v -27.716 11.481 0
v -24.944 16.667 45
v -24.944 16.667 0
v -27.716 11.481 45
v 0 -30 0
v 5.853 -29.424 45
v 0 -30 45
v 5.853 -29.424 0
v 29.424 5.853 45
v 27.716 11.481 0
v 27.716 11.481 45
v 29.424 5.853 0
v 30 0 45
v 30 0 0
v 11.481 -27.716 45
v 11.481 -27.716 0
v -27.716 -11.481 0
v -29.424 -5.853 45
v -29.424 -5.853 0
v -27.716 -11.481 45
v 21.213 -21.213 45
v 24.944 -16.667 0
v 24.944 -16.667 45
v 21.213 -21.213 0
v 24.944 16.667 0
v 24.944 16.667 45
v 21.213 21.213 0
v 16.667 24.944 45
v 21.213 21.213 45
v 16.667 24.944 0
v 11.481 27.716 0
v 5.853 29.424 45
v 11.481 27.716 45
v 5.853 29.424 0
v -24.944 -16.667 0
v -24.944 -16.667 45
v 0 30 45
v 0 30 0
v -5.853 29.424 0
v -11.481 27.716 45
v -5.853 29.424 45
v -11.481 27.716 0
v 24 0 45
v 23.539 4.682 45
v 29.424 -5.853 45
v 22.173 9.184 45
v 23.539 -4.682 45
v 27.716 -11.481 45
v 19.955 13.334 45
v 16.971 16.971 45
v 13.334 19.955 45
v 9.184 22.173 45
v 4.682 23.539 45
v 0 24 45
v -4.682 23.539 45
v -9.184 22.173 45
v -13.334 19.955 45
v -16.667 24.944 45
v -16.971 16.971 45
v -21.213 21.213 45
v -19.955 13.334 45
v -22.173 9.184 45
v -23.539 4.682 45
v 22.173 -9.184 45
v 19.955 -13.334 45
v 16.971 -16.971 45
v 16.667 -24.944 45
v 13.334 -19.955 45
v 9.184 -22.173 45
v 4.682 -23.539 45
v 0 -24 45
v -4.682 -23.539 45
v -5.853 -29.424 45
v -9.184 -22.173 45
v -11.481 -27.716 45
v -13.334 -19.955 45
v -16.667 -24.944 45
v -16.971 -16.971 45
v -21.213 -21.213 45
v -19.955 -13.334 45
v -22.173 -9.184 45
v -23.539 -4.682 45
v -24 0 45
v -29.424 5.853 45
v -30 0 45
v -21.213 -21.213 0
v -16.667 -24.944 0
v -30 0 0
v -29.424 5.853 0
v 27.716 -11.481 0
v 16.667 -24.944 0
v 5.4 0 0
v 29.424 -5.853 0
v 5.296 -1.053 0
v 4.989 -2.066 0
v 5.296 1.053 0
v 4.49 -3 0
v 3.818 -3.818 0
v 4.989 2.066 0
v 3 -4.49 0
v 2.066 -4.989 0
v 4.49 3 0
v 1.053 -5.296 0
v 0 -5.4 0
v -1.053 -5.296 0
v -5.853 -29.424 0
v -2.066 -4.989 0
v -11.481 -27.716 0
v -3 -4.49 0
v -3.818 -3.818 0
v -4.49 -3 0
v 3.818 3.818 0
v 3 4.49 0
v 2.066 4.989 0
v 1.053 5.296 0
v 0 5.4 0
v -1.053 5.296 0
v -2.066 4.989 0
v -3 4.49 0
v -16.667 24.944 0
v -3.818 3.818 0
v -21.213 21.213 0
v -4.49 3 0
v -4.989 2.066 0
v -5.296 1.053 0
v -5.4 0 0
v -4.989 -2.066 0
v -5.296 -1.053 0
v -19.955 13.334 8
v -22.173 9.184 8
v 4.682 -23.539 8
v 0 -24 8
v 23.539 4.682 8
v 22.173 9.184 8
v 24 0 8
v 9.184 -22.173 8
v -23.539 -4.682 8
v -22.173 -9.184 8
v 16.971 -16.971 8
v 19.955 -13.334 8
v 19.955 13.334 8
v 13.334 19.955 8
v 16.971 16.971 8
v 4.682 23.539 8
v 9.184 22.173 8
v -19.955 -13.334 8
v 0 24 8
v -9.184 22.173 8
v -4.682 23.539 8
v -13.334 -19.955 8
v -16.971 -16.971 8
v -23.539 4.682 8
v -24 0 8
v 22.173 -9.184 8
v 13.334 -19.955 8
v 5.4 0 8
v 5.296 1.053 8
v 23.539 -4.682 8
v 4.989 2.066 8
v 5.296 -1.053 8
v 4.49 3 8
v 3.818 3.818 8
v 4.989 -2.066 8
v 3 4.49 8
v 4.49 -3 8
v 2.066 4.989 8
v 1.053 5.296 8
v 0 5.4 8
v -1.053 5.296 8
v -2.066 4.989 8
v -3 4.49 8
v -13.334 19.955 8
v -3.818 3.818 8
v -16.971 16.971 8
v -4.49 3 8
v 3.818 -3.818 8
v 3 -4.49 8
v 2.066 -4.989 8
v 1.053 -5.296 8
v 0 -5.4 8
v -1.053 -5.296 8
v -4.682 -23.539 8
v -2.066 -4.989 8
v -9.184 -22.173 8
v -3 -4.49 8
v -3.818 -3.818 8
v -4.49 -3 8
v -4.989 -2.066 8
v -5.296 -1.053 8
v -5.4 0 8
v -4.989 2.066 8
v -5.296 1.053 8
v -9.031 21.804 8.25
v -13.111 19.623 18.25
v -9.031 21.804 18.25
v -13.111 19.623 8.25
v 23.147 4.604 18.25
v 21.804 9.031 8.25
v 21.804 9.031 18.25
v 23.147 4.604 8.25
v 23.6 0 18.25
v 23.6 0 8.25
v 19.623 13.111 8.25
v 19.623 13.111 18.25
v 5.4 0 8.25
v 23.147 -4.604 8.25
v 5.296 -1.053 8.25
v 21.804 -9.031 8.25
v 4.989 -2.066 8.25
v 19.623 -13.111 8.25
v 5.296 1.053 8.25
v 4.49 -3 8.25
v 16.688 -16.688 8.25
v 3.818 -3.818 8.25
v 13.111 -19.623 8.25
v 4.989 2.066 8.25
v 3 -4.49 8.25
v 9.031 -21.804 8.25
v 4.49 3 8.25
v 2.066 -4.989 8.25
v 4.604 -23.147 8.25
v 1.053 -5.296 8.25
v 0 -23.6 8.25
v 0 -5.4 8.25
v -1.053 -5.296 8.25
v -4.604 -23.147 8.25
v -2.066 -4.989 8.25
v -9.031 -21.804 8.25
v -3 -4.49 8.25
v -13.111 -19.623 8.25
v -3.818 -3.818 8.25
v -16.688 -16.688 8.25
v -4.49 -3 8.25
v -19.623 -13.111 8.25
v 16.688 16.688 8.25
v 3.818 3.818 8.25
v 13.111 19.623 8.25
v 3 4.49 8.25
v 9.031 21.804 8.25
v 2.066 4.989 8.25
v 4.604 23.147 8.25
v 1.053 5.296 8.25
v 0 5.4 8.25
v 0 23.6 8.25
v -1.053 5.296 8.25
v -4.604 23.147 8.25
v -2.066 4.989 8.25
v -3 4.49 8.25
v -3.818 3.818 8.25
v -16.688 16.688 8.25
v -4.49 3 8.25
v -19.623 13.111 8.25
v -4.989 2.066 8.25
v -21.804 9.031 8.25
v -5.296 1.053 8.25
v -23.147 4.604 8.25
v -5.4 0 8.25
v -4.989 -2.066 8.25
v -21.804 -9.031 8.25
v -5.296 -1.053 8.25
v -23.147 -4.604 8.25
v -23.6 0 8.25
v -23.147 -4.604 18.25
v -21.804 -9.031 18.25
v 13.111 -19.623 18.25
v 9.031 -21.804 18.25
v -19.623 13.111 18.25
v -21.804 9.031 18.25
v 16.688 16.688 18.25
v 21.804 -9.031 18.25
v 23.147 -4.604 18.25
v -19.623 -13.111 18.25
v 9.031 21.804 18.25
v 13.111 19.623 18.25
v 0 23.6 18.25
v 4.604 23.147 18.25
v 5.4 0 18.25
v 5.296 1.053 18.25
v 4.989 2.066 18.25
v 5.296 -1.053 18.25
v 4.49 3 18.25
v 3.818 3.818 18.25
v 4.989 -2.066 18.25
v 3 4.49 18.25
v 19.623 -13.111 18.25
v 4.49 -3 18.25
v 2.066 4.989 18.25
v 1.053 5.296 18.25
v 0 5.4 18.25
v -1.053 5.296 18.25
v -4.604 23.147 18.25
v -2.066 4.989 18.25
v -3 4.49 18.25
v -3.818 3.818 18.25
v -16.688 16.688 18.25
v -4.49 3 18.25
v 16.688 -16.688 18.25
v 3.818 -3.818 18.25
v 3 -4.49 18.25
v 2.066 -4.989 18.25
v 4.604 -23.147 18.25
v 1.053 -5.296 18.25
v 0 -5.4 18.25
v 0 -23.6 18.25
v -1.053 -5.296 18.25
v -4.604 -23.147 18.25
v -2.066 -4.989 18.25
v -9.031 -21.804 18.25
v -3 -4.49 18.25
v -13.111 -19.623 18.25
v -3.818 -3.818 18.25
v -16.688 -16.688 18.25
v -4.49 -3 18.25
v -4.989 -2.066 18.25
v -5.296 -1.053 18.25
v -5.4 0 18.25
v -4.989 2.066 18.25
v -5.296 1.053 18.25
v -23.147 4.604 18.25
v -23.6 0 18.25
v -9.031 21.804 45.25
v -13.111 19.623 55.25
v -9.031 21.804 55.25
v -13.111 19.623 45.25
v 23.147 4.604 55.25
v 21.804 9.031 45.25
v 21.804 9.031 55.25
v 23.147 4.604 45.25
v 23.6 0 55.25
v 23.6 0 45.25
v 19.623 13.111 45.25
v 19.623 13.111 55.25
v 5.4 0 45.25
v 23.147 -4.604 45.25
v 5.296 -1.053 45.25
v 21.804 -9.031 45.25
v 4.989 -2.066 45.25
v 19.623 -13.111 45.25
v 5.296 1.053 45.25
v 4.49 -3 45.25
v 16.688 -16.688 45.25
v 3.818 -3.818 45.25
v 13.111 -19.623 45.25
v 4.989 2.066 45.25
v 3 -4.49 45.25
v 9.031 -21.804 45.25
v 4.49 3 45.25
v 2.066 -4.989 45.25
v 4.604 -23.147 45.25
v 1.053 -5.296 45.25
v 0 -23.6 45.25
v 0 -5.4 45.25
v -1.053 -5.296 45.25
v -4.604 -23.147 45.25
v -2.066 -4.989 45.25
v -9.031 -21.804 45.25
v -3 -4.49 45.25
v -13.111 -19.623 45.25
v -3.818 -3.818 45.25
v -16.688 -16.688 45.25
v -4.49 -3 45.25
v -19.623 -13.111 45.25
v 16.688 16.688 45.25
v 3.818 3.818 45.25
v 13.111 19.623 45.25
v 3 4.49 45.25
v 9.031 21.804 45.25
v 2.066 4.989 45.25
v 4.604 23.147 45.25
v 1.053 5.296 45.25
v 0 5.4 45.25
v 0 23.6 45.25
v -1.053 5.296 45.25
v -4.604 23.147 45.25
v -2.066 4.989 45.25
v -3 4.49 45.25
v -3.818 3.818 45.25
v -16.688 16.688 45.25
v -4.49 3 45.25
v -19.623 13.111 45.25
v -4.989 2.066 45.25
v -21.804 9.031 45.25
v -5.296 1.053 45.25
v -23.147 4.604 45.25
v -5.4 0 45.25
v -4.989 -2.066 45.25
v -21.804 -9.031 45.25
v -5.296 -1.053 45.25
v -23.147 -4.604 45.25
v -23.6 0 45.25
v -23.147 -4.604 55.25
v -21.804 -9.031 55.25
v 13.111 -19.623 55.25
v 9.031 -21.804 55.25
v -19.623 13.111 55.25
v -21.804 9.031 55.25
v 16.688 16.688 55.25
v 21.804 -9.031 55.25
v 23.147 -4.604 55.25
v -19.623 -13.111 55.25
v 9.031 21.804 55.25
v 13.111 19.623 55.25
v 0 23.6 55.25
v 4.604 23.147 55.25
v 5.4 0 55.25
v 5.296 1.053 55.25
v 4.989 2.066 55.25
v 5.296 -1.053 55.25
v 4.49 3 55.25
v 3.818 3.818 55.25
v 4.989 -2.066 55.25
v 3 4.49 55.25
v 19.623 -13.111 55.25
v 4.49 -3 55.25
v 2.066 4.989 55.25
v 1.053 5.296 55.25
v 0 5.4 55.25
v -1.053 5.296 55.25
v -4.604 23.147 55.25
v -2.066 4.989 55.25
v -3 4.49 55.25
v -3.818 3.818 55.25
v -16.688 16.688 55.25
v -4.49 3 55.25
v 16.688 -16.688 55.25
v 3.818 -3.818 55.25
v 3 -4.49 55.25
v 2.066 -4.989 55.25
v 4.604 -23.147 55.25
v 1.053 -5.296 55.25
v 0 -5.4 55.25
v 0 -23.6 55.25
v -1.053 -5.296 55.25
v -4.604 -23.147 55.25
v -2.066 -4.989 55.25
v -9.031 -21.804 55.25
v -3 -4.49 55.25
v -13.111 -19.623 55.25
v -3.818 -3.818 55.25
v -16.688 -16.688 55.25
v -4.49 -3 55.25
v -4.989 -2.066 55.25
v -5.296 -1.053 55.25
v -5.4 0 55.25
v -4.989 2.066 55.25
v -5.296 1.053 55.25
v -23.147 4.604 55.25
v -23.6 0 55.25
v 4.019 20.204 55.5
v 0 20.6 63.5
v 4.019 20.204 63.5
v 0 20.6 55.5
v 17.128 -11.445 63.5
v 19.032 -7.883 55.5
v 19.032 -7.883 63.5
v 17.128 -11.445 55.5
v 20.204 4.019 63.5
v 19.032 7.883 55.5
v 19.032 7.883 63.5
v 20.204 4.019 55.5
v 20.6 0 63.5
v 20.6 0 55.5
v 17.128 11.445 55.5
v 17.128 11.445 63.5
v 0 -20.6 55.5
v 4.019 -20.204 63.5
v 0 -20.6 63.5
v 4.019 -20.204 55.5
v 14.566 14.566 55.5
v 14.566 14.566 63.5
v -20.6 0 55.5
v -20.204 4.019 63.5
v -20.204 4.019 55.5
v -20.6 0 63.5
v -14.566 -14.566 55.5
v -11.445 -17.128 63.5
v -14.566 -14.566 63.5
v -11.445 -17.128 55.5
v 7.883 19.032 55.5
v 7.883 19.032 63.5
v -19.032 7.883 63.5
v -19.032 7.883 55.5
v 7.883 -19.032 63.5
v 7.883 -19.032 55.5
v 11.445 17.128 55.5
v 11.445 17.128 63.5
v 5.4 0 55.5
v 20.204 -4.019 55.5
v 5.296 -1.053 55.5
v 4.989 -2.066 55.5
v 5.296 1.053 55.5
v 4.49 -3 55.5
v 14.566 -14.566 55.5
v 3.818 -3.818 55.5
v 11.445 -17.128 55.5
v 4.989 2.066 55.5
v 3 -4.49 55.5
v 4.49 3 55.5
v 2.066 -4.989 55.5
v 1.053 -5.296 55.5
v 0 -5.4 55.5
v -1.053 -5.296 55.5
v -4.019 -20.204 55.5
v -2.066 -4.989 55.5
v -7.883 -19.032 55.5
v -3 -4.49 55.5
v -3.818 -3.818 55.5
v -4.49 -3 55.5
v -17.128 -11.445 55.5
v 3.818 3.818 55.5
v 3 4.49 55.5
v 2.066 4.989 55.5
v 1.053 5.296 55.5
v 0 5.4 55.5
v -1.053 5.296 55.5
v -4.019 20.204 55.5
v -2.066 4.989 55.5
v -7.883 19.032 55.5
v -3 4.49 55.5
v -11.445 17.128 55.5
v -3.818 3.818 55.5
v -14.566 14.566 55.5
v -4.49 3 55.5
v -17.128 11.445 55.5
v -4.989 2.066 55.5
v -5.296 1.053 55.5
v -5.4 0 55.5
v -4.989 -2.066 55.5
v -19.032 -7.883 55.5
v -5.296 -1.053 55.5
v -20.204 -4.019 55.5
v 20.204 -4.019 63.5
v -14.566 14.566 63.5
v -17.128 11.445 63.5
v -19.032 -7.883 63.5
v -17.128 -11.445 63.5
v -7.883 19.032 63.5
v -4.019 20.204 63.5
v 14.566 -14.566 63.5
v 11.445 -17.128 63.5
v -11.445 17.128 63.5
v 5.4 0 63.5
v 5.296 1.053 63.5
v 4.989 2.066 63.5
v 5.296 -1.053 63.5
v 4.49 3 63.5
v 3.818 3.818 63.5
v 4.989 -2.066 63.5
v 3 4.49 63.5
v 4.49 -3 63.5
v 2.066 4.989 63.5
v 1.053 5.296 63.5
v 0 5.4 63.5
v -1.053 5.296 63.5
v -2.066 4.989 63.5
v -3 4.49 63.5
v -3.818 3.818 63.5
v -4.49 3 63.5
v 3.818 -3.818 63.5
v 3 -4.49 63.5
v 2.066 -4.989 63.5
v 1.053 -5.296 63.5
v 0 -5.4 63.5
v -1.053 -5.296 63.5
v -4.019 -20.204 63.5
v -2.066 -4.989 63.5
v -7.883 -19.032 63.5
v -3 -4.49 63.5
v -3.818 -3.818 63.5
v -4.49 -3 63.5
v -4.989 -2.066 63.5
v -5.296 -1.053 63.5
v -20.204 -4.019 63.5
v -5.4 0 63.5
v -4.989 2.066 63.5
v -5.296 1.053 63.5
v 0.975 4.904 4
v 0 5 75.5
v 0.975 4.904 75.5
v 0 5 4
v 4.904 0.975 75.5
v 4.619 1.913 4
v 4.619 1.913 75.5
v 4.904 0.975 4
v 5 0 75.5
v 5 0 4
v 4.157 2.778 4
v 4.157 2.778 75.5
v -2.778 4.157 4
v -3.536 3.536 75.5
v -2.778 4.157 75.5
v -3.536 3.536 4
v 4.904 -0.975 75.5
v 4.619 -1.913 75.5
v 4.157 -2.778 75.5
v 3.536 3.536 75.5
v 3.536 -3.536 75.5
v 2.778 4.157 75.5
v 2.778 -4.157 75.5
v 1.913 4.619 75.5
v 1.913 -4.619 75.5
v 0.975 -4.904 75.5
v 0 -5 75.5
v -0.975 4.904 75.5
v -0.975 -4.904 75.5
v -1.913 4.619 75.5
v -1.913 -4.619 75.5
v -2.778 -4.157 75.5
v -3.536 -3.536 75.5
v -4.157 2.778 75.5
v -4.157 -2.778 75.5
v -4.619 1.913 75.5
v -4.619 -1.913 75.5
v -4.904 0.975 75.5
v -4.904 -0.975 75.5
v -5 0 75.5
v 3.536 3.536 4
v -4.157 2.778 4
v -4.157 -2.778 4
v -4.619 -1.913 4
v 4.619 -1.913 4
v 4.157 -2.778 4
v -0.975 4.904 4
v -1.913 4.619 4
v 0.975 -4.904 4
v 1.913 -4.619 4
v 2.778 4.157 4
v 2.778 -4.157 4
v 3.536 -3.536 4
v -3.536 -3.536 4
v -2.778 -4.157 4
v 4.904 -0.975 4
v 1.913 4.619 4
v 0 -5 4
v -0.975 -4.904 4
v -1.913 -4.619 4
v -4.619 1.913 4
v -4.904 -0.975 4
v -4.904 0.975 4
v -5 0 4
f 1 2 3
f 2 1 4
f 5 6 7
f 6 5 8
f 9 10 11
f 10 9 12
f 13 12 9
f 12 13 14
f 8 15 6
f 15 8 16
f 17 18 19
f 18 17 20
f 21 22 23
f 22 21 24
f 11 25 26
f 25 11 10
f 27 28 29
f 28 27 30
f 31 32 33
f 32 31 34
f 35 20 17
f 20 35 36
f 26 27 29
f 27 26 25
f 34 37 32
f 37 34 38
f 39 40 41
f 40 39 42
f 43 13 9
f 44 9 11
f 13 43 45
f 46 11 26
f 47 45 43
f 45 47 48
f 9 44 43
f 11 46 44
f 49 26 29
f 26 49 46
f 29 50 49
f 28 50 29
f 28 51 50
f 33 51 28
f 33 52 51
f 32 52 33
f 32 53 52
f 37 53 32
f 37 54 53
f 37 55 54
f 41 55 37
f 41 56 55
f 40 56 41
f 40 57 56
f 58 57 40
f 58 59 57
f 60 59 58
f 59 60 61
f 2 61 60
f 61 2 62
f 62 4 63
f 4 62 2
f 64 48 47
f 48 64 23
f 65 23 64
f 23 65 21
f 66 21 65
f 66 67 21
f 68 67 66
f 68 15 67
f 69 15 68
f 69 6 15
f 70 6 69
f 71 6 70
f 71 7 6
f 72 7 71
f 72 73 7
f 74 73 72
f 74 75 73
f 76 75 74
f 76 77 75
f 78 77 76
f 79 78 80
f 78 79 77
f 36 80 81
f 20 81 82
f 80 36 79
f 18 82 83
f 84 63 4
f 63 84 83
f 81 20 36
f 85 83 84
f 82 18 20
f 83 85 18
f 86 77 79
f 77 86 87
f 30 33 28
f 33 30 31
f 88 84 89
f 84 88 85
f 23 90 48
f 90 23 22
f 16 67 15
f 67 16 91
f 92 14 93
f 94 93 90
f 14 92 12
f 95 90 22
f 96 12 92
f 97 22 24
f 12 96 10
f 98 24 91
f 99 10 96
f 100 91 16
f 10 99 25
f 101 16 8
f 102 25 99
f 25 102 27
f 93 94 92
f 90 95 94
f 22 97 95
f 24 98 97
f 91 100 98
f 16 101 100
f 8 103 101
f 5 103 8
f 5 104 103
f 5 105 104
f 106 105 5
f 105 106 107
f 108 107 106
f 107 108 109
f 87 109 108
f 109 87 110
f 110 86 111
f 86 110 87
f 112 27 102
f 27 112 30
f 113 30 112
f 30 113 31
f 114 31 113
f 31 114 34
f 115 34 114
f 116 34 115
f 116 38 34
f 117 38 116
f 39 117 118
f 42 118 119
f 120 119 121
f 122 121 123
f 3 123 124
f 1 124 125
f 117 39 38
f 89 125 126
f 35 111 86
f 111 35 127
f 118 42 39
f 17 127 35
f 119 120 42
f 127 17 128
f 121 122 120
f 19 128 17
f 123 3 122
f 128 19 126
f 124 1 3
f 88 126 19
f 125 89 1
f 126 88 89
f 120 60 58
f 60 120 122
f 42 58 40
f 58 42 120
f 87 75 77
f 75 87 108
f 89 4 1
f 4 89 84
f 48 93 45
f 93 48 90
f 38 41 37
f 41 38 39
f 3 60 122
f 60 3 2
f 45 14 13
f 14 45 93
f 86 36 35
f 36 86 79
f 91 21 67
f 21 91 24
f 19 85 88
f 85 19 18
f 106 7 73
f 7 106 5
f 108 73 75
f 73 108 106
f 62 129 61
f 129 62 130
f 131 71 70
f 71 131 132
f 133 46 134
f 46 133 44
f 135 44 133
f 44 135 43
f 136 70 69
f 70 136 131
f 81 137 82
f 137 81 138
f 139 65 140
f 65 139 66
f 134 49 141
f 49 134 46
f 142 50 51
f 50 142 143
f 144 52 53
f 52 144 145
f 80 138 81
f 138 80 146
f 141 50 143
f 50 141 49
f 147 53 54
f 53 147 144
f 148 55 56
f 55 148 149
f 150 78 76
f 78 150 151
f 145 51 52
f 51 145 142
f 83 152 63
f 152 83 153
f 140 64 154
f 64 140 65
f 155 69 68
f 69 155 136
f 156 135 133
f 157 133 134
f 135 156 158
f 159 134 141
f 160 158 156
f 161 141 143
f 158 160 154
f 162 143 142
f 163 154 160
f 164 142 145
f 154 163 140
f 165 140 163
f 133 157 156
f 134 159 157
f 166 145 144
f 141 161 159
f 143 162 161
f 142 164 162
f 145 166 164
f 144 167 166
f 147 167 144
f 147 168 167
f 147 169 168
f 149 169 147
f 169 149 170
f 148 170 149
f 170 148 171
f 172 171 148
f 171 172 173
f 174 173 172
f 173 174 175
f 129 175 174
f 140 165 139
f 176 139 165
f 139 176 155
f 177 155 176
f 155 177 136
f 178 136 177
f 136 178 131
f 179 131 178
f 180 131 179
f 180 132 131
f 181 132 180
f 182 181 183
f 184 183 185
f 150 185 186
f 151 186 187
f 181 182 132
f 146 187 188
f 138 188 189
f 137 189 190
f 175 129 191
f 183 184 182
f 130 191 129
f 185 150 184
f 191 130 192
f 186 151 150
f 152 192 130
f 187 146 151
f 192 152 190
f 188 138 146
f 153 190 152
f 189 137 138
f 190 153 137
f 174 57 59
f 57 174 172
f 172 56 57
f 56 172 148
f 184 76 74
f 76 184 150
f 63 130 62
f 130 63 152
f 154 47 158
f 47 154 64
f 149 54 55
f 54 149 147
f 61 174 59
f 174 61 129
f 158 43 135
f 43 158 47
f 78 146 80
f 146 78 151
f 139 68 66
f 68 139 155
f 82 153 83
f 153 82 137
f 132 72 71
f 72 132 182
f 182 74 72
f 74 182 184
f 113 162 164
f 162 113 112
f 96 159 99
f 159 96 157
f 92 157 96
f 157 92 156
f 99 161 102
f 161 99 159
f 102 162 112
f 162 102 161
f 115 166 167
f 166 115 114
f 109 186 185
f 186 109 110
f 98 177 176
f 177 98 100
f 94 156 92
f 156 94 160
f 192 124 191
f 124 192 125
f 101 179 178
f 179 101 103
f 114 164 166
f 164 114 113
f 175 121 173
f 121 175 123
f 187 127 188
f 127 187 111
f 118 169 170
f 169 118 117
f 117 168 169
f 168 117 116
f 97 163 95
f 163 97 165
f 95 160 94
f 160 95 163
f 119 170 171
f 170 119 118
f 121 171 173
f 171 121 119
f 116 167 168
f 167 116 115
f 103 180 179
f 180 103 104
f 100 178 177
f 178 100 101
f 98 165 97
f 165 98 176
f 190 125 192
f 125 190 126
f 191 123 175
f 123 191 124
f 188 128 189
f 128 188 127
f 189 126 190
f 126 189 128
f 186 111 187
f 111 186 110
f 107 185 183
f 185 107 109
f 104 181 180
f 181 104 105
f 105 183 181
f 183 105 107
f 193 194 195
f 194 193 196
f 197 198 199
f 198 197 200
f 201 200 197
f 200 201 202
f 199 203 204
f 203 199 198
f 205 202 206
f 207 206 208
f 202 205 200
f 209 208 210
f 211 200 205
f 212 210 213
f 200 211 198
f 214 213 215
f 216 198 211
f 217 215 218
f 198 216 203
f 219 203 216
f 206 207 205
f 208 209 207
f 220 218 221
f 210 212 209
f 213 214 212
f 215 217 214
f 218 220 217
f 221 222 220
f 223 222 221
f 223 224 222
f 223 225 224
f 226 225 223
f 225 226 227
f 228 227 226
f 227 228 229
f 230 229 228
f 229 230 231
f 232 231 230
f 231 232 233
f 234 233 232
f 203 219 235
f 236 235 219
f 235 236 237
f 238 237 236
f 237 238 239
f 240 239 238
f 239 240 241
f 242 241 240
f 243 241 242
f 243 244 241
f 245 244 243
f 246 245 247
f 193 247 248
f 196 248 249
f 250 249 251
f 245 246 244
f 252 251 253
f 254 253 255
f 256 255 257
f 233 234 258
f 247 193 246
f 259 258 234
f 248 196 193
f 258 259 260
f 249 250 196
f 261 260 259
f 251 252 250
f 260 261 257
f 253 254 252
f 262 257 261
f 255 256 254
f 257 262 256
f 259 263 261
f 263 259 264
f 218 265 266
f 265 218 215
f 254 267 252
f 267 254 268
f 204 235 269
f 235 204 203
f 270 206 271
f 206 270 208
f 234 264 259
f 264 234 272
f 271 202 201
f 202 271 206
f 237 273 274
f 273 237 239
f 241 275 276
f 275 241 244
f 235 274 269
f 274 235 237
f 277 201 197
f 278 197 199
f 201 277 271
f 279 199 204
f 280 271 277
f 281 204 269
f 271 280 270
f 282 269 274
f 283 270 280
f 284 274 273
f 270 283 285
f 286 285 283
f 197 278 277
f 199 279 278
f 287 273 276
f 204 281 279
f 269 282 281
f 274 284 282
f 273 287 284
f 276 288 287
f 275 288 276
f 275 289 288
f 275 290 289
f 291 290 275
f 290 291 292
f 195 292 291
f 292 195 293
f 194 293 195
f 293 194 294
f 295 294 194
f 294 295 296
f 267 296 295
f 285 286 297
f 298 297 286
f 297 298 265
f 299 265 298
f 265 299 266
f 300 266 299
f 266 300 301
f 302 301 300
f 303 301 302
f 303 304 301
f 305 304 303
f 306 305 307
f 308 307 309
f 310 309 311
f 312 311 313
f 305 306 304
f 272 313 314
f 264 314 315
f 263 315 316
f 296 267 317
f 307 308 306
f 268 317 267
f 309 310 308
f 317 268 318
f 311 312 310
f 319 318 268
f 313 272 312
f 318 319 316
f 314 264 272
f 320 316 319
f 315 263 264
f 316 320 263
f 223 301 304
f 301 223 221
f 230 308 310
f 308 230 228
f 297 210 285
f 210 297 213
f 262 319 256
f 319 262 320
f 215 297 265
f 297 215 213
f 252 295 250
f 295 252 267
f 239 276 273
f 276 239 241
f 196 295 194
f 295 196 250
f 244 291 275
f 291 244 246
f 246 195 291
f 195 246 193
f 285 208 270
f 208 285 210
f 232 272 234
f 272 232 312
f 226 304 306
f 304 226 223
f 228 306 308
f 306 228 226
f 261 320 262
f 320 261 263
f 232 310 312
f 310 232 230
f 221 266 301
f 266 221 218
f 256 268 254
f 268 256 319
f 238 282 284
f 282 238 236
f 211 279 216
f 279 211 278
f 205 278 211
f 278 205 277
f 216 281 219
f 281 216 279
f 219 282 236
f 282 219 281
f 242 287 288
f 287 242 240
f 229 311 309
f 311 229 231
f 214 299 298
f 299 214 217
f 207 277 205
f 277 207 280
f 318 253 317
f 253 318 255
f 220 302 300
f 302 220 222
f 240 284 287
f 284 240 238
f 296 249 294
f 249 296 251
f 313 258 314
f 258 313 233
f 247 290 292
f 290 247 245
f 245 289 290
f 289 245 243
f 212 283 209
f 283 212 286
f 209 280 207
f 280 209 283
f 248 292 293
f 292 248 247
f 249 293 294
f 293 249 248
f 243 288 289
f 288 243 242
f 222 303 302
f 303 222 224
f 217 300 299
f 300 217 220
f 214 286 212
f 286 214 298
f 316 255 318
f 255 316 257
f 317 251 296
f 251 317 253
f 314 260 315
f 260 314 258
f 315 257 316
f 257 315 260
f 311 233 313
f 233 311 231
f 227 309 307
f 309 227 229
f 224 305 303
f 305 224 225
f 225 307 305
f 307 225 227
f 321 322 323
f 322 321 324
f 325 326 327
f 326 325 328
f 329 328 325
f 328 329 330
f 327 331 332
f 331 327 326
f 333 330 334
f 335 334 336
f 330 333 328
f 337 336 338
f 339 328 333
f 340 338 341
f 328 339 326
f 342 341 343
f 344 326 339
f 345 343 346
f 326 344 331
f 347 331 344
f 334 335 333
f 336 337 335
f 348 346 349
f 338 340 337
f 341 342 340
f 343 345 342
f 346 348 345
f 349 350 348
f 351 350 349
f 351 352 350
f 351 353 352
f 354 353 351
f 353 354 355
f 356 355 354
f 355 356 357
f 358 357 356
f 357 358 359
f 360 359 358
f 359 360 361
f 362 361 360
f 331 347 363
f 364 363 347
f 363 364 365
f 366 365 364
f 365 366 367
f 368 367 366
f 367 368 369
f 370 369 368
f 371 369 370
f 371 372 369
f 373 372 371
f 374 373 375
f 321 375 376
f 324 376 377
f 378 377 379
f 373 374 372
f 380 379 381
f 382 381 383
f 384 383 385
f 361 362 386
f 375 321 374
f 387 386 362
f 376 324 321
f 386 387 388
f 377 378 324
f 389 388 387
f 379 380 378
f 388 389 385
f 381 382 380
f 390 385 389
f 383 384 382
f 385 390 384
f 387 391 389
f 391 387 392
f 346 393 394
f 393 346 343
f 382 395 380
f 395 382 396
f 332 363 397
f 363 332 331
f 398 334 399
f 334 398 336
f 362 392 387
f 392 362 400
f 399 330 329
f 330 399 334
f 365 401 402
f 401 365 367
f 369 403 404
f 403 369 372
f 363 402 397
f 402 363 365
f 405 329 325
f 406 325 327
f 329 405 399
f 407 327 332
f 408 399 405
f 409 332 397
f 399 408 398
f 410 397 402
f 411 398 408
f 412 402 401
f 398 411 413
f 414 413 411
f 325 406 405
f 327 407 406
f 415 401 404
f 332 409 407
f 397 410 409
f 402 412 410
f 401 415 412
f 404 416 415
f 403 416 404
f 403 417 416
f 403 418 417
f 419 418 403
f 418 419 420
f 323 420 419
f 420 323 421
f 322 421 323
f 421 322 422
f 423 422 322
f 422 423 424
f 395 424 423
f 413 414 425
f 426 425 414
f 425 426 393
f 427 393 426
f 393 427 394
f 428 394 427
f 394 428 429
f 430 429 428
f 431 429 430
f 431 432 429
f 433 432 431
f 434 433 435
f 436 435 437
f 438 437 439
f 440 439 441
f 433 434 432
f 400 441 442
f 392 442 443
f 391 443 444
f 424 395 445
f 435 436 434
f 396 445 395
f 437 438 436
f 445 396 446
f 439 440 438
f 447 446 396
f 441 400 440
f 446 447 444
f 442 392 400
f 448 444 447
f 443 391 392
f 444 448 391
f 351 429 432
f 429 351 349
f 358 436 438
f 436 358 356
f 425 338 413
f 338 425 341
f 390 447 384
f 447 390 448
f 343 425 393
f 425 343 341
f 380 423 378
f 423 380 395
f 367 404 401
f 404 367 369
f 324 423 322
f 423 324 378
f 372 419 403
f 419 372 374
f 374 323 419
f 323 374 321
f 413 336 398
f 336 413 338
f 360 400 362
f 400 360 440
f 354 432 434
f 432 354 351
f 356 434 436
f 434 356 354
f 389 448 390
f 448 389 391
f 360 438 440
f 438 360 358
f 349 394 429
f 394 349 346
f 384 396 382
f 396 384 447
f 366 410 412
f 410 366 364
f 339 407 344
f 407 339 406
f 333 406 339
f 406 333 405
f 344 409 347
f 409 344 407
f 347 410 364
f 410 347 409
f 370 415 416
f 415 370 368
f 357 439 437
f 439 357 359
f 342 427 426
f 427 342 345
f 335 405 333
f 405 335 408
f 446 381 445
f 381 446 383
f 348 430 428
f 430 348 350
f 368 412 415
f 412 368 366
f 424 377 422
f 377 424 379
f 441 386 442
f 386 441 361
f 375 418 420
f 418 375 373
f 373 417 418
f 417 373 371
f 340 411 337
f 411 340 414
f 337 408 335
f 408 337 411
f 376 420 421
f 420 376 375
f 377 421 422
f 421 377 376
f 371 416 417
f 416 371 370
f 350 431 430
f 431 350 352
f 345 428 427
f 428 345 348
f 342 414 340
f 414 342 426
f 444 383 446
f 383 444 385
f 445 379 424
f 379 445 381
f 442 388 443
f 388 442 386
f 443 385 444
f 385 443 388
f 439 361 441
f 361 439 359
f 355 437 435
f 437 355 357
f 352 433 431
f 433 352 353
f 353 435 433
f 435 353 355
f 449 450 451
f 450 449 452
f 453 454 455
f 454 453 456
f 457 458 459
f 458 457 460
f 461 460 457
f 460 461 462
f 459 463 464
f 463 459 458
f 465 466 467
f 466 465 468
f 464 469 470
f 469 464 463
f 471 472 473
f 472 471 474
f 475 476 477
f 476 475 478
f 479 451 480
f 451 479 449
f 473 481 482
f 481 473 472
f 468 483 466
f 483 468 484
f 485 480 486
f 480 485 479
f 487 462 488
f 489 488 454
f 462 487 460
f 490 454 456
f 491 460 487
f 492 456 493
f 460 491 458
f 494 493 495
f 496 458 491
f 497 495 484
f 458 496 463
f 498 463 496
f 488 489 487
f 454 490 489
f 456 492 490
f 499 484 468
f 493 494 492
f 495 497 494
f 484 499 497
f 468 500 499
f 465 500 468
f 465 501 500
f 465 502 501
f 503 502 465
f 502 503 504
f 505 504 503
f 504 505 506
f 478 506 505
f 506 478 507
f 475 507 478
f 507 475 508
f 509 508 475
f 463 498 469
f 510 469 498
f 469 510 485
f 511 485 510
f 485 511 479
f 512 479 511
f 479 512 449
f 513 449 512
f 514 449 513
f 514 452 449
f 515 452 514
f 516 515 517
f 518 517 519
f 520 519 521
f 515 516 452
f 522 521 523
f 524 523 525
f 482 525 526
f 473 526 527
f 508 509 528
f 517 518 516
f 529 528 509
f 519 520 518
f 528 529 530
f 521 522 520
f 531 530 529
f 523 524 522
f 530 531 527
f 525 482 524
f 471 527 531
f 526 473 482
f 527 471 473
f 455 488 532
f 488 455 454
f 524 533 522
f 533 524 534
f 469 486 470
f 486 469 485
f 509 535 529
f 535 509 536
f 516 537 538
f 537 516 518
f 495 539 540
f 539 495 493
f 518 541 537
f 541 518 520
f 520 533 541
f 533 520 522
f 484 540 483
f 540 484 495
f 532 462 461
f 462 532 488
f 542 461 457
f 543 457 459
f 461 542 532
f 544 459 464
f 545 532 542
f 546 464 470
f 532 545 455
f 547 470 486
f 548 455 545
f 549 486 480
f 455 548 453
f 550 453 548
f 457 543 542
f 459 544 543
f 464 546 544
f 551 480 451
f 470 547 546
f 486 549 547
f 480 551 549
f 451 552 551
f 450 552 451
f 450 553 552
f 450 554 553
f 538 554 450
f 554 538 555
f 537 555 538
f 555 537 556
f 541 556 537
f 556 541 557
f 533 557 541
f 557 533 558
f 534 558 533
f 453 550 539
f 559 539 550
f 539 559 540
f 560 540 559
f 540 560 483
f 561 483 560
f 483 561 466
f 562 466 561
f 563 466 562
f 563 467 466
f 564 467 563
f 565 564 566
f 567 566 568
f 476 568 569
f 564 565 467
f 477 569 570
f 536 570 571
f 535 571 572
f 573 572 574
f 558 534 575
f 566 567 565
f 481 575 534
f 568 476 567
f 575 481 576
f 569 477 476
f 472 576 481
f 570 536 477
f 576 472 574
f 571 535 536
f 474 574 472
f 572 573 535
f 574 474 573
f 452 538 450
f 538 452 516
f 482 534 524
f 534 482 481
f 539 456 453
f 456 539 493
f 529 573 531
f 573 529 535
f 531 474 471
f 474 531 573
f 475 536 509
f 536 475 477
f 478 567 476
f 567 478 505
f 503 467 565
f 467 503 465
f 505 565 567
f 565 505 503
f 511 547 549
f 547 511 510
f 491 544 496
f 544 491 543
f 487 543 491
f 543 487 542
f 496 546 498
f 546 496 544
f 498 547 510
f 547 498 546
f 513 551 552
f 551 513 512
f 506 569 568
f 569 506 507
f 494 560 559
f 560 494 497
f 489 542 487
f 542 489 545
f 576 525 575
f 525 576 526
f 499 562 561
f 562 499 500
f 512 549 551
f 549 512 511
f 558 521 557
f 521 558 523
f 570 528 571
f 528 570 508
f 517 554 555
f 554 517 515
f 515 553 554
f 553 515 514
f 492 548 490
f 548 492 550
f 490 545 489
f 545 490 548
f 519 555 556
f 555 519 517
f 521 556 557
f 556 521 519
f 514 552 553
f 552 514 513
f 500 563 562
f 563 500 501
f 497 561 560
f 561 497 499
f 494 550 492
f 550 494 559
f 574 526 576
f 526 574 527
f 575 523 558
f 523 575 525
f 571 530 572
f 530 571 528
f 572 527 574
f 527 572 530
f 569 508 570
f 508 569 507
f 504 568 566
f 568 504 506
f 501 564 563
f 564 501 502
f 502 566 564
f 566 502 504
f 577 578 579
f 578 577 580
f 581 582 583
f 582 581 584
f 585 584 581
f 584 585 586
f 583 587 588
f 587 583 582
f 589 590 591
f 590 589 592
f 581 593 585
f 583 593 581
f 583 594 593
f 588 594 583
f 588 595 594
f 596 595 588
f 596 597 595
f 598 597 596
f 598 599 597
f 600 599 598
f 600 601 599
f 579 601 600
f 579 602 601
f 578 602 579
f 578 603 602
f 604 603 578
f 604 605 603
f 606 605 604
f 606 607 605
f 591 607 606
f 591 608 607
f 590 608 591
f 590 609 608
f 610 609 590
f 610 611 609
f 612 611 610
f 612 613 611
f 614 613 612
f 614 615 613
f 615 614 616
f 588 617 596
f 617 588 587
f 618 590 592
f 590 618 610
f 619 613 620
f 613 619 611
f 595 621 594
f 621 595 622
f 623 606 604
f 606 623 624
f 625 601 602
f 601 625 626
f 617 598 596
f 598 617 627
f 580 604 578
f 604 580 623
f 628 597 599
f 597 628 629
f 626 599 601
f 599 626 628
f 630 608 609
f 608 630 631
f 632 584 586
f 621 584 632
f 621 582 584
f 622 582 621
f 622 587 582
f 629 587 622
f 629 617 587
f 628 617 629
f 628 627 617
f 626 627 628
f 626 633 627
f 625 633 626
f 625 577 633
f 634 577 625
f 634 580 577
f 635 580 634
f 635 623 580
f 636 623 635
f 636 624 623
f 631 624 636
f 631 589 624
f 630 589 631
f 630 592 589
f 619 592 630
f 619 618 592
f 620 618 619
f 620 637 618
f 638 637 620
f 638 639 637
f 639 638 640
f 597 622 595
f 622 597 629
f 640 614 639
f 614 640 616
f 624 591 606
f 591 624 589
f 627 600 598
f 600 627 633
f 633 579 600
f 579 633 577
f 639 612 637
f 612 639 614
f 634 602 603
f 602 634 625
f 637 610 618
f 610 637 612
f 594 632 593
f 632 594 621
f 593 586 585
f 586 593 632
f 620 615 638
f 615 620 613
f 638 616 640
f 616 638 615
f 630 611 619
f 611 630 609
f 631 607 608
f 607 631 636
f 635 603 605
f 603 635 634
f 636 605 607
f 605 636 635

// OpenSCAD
$fn = 32;

// ------------------------------------------------------------------------
// Bearing housing: housing d60, two bearings and a shaft
// Every part is its own module, assembly() places them once.
// ------------------------------------------------------------------------

// --- part 1 ---
module housing() {
  difference() {
    cylinder(h = 45, d = 60);
    translate([0, 0, 8]) cylinder(h = 38, d = 48);
    translate([0, 0, -1]) cylinder(h = 10, d = 10.8);
  }
}

// --- part 2 ---
module bearing_lower() {
  difference() {
      translate([0, 0, 0]) cylinder(h = 10, d = 47.2);
      translate([0, 0, -1]) cylinder(h = 12, d = 10.8);
    }
}

// --- part 3 ---
module bearing_upper() {
  difference() {
      translate([0, 0, 0]) cylinder(h = 10, d = 47.2);
      translate([0, 0, -1]) cylinder(h = 12, d = 10.8);
    }
}

// --- part 4 ---
module spacer() {
  difference() {
      translate([0, 0, 0]) cylinder(h = 8, d = 41.2);
      translate([0, 0, -1]) cylinder(h = 10, d = 10.8);
    }
}

// --- part 5 ---
module shaft() {
  translate([0, 0, -35.75]) cylinder(h = 71.5, d = 10);
}

// --- assembly ---
module assembly() {
  translate([0, 0, 0]) rotate([0, 0, 0]) housing();
  translate([0, 0, 8.25]) rotate([0, 0, 0]) bearing_lower();
  translate([0, 0, 45.25]) rotate([0, 0, 0]) bearing_upper();
  translate([0, 0, 55.5]) rotate([0, 0, 0]) spacer();
  translate([0, 0, 39.75]) rotate([0, 0, 0]) shaft();
}

assembly();
